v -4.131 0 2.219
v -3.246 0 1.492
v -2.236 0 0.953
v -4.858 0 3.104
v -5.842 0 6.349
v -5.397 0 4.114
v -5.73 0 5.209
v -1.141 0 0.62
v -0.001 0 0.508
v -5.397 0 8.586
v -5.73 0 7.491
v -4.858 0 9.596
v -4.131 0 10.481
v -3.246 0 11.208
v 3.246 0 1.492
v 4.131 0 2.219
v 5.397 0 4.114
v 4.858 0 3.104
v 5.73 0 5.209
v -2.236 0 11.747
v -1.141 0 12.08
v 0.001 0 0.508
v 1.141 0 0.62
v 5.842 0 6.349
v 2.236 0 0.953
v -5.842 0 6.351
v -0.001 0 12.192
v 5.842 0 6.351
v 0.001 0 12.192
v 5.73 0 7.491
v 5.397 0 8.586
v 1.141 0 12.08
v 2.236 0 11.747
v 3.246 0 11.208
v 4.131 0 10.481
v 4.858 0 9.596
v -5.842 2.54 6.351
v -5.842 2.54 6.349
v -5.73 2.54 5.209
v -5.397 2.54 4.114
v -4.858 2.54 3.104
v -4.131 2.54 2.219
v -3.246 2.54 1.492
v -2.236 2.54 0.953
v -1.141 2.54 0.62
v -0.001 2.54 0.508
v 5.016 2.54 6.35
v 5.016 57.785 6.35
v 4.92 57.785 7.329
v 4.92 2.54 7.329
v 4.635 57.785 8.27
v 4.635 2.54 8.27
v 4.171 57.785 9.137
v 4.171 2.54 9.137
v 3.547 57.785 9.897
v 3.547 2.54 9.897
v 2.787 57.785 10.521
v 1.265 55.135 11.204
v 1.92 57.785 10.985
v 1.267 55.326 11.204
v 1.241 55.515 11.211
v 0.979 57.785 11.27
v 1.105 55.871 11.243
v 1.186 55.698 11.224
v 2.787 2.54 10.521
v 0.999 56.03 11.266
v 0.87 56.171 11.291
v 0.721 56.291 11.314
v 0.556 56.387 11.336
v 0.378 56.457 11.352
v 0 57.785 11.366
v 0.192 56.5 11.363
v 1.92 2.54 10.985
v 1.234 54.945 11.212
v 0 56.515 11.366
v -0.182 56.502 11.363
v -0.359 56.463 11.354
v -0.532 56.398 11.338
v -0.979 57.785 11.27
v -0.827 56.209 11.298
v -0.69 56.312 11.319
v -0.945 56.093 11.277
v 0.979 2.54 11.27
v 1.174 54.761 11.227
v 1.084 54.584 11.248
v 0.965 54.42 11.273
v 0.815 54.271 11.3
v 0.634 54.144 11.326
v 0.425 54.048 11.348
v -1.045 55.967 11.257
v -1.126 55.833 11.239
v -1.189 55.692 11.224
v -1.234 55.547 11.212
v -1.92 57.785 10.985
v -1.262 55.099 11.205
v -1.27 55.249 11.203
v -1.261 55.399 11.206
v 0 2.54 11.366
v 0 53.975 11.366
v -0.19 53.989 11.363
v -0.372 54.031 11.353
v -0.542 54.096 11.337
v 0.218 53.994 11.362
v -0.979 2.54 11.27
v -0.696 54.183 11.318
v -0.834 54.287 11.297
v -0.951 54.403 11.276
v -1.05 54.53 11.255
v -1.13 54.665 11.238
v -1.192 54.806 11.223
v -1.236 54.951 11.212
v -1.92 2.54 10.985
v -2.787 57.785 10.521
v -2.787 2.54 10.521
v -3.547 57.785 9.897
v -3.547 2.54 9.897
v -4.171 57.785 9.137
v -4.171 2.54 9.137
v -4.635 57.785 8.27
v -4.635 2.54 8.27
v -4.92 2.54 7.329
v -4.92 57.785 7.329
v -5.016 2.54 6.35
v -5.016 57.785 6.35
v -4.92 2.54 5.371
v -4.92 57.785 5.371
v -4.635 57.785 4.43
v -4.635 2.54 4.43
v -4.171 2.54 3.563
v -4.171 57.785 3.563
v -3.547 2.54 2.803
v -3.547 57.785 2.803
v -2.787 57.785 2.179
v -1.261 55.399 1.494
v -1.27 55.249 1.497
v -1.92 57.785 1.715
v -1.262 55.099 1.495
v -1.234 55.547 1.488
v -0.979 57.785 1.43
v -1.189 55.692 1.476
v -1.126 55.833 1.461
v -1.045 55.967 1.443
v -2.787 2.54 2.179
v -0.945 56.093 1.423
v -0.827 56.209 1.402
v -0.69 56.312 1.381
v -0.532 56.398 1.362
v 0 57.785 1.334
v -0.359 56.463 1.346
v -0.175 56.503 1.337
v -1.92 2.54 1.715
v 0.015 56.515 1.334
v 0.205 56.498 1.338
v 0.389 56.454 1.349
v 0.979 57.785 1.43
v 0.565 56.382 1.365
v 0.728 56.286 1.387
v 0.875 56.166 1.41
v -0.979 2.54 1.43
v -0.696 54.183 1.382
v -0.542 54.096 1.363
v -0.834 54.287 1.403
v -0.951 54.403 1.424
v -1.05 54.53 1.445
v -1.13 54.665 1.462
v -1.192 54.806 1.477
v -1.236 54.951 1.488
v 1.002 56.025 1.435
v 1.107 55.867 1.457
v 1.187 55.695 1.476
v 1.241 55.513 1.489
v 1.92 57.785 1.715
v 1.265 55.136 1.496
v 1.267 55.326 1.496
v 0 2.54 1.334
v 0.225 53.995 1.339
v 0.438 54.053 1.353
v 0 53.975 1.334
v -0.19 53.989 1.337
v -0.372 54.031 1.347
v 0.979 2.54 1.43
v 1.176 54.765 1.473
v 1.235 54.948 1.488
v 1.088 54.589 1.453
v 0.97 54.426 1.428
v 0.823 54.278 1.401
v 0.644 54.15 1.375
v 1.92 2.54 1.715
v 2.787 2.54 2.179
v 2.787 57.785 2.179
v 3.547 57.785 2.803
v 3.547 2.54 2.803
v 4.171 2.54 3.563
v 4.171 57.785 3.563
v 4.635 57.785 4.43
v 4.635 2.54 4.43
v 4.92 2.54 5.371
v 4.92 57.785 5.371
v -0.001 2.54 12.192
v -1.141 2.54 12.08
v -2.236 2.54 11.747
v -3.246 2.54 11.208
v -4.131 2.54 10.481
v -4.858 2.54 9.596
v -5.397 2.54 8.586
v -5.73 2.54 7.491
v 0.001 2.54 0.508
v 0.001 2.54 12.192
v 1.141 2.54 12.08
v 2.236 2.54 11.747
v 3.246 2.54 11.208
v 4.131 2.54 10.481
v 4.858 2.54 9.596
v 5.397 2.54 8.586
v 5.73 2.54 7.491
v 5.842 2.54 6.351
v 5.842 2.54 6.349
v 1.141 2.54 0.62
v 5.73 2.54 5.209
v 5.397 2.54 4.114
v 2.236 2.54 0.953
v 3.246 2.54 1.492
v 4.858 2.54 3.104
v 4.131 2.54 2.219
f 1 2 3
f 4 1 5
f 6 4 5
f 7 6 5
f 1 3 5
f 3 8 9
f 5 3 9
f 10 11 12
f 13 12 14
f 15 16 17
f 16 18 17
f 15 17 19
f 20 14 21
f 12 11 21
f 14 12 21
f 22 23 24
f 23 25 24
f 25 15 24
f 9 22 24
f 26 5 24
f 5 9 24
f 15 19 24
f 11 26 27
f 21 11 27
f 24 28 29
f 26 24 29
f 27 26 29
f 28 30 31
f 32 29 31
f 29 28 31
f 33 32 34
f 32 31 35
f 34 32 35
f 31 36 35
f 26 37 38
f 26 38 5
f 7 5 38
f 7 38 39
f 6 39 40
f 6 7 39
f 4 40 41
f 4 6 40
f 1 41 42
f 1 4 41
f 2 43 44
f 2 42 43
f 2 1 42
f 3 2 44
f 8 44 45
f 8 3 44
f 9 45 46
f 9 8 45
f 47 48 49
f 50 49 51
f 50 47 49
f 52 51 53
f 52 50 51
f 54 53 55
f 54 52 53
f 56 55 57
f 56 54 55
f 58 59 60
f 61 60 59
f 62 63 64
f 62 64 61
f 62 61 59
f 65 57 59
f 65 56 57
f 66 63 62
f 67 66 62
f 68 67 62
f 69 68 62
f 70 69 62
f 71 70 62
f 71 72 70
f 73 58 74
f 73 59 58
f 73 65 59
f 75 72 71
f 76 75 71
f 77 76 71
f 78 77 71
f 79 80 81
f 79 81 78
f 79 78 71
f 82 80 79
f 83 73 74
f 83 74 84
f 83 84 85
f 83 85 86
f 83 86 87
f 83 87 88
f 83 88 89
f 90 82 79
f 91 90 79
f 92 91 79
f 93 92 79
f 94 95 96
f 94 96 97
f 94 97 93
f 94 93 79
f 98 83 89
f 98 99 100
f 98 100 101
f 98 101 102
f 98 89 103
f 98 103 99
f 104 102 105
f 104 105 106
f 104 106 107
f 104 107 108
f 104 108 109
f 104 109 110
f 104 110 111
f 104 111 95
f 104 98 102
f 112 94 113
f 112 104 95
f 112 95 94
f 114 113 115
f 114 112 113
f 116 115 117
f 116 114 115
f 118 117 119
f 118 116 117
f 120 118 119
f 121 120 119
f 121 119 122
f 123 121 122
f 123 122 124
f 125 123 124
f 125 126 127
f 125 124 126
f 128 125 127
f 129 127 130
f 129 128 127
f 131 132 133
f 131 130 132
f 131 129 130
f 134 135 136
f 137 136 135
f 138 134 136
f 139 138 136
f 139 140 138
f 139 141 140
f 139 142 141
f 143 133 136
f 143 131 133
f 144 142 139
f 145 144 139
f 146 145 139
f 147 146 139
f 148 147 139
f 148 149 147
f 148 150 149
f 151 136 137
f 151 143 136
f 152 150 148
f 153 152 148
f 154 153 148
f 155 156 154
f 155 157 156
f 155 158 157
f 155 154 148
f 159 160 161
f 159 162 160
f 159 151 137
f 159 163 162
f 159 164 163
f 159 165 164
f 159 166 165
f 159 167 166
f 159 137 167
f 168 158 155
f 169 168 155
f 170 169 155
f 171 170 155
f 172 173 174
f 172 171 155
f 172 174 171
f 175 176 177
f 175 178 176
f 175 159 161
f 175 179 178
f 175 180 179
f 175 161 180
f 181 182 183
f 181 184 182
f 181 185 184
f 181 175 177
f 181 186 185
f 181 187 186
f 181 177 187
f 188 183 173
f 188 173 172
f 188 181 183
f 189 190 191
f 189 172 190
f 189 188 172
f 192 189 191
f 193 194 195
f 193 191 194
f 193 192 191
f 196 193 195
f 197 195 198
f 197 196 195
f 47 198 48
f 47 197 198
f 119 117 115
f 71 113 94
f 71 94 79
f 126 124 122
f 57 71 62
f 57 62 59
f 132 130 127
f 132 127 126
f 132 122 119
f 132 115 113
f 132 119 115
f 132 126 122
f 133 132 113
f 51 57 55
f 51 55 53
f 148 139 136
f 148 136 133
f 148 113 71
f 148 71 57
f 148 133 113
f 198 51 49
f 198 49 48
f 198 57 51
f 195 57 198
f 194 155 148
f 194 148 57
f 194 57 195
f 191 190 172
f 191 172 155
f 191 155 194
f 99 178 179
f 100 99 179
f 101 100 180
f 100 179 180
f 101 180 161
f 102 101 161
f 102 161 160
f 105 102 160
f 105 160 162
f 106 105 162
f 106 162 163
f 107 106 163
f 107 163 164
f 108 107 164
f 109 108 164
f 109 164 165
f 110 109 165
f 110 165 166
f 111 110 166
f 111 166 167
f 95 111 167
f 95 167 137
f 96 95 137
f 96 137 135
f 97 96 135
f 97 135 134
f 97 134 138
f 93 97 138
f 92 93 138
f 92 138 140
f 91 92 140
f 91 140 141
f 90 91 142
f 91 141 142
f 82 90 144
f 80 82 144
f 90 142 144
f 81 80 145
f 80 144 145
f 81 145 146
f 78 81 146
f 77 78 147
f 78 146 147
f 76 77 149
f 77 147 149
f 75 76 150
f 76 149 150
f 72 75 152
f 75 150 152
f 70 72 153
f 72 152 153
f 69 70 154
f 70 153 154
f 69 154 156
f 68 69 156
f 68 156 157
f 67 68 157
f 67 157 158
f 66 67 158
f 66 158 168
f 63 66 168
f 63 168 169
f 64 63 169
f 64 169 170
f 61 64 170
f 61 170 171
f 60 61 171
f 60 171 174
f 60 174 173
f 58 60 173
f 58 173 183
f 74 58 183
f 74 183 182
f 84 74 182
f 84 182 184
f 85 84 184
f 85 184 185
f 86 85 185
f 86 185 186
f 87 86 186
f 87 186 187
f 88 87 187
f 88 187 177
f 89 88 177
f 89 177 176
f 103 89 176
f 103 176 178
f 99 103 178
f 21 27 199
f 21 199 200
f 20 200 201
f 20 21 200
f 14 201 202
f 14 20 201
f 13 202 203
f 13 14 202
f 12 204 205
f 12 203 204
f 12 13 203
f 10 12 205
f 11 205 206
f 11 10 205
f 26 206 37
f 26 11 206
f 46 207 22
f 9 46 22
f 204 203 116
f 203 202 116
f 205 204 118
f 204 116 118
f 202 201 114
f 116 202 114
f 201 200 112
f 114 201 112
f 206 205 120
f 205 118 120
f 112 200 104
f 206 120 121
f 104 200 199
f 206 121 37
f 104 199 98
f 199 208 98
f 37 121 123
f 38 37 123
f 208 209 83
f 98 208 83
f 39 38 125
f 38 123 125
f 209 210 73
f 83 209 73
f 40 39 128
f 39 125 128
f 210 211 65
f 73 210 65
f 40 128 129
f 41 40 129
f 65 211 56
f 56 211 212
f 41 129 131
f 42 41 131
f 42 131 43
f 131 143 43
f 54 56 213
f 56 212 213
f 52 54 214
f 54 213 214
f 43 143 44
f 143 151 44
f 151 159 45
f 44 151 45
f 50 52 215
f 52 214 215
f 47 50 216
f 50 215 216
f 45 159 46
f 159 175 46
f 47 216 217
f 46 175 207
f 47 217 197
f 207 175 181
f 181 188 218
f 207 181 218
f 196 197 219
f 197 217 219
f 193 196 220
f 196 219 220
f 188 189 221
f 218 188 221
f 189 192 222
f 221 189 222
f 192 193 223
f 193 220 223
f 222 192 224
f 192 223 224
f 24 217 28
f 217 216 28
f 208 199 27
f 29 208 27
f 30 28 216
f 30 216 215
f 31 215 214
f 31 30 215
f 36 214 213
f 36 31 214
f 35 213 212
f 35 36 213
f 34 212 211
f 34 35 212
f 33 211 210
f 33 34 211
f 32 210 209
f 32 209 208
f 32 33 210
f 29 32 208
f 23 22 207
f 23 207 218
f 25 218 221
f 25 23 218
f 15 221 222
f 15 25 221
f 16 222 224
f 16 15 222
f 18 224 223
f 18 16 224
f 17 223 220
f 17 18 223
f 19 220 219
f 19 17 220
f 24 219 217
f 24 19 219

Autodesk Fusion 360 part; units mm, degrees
sketch "Sketch1" plane through (0, 0, 0) normal (0, 1, 0) x (1, 0, 0)
  circle A0 centre (0, -6.35) radius 5.0165
  dimension "d1" = 10.033
extrude "Extrude1" add sketch "Sketch1" along normal blind 57.785
hole "Hole1" at (0, 55.245, 11.3665) direction (0, 0, -1) diameter 2.54 depth 19.05 tip angle 118
extrude "Extrude2" cut 1 faces at (-0.3721, 0, 4.7198) along direction (0, 1, 0) blind 2.54
sketch "Sketch3" plane through (0, 2.54, 0) normal (0, -1, 0) x (1, 0, 0)
  circle A0 centre (0, 6.35) radius 5.0165
  line L0 (-2.54, 8.89) -> (2.54, 8.89)
  line L1 (2.54, 8.89) -> (2.54, 3.81)
  line L2 (2.54, 3.81) -> (-2.54, 3.81)
  line L3 (-2.54, 3.81) -> (-2.54, 8.89)
extrude "Extrude3" add sketch "Sketch3" along normal blind 2.54 contours L0 L1 L2 L3
extrude "Extrude4" add 1 faces at (0.8467, 0.8467, 8.89) along direction (0, 0, 1) blind 3.302
extrude "Extrude5" add 1 faces at (2.54, 0.8467, 8.8926) along direction (1, 0, 0) blind 3.302
extrude "Extrude6" add 1 faces at (2.5426, 0.8467, 3.81) along direction (0, 0, -1) blind 3.302
extrude "Extrude7" add 1 faces at (-2.54, 0.8467, 4.908) along direction (-1, 0, 0) blind 3.302
fillet "Fillet1" radius 5.842 4 edges at (-5.842, 1.27, 12.192) (5.842, 1.27, 12.192) (5.842, 1.27, 0.508) (-5.842, 1.27, 0.508)
